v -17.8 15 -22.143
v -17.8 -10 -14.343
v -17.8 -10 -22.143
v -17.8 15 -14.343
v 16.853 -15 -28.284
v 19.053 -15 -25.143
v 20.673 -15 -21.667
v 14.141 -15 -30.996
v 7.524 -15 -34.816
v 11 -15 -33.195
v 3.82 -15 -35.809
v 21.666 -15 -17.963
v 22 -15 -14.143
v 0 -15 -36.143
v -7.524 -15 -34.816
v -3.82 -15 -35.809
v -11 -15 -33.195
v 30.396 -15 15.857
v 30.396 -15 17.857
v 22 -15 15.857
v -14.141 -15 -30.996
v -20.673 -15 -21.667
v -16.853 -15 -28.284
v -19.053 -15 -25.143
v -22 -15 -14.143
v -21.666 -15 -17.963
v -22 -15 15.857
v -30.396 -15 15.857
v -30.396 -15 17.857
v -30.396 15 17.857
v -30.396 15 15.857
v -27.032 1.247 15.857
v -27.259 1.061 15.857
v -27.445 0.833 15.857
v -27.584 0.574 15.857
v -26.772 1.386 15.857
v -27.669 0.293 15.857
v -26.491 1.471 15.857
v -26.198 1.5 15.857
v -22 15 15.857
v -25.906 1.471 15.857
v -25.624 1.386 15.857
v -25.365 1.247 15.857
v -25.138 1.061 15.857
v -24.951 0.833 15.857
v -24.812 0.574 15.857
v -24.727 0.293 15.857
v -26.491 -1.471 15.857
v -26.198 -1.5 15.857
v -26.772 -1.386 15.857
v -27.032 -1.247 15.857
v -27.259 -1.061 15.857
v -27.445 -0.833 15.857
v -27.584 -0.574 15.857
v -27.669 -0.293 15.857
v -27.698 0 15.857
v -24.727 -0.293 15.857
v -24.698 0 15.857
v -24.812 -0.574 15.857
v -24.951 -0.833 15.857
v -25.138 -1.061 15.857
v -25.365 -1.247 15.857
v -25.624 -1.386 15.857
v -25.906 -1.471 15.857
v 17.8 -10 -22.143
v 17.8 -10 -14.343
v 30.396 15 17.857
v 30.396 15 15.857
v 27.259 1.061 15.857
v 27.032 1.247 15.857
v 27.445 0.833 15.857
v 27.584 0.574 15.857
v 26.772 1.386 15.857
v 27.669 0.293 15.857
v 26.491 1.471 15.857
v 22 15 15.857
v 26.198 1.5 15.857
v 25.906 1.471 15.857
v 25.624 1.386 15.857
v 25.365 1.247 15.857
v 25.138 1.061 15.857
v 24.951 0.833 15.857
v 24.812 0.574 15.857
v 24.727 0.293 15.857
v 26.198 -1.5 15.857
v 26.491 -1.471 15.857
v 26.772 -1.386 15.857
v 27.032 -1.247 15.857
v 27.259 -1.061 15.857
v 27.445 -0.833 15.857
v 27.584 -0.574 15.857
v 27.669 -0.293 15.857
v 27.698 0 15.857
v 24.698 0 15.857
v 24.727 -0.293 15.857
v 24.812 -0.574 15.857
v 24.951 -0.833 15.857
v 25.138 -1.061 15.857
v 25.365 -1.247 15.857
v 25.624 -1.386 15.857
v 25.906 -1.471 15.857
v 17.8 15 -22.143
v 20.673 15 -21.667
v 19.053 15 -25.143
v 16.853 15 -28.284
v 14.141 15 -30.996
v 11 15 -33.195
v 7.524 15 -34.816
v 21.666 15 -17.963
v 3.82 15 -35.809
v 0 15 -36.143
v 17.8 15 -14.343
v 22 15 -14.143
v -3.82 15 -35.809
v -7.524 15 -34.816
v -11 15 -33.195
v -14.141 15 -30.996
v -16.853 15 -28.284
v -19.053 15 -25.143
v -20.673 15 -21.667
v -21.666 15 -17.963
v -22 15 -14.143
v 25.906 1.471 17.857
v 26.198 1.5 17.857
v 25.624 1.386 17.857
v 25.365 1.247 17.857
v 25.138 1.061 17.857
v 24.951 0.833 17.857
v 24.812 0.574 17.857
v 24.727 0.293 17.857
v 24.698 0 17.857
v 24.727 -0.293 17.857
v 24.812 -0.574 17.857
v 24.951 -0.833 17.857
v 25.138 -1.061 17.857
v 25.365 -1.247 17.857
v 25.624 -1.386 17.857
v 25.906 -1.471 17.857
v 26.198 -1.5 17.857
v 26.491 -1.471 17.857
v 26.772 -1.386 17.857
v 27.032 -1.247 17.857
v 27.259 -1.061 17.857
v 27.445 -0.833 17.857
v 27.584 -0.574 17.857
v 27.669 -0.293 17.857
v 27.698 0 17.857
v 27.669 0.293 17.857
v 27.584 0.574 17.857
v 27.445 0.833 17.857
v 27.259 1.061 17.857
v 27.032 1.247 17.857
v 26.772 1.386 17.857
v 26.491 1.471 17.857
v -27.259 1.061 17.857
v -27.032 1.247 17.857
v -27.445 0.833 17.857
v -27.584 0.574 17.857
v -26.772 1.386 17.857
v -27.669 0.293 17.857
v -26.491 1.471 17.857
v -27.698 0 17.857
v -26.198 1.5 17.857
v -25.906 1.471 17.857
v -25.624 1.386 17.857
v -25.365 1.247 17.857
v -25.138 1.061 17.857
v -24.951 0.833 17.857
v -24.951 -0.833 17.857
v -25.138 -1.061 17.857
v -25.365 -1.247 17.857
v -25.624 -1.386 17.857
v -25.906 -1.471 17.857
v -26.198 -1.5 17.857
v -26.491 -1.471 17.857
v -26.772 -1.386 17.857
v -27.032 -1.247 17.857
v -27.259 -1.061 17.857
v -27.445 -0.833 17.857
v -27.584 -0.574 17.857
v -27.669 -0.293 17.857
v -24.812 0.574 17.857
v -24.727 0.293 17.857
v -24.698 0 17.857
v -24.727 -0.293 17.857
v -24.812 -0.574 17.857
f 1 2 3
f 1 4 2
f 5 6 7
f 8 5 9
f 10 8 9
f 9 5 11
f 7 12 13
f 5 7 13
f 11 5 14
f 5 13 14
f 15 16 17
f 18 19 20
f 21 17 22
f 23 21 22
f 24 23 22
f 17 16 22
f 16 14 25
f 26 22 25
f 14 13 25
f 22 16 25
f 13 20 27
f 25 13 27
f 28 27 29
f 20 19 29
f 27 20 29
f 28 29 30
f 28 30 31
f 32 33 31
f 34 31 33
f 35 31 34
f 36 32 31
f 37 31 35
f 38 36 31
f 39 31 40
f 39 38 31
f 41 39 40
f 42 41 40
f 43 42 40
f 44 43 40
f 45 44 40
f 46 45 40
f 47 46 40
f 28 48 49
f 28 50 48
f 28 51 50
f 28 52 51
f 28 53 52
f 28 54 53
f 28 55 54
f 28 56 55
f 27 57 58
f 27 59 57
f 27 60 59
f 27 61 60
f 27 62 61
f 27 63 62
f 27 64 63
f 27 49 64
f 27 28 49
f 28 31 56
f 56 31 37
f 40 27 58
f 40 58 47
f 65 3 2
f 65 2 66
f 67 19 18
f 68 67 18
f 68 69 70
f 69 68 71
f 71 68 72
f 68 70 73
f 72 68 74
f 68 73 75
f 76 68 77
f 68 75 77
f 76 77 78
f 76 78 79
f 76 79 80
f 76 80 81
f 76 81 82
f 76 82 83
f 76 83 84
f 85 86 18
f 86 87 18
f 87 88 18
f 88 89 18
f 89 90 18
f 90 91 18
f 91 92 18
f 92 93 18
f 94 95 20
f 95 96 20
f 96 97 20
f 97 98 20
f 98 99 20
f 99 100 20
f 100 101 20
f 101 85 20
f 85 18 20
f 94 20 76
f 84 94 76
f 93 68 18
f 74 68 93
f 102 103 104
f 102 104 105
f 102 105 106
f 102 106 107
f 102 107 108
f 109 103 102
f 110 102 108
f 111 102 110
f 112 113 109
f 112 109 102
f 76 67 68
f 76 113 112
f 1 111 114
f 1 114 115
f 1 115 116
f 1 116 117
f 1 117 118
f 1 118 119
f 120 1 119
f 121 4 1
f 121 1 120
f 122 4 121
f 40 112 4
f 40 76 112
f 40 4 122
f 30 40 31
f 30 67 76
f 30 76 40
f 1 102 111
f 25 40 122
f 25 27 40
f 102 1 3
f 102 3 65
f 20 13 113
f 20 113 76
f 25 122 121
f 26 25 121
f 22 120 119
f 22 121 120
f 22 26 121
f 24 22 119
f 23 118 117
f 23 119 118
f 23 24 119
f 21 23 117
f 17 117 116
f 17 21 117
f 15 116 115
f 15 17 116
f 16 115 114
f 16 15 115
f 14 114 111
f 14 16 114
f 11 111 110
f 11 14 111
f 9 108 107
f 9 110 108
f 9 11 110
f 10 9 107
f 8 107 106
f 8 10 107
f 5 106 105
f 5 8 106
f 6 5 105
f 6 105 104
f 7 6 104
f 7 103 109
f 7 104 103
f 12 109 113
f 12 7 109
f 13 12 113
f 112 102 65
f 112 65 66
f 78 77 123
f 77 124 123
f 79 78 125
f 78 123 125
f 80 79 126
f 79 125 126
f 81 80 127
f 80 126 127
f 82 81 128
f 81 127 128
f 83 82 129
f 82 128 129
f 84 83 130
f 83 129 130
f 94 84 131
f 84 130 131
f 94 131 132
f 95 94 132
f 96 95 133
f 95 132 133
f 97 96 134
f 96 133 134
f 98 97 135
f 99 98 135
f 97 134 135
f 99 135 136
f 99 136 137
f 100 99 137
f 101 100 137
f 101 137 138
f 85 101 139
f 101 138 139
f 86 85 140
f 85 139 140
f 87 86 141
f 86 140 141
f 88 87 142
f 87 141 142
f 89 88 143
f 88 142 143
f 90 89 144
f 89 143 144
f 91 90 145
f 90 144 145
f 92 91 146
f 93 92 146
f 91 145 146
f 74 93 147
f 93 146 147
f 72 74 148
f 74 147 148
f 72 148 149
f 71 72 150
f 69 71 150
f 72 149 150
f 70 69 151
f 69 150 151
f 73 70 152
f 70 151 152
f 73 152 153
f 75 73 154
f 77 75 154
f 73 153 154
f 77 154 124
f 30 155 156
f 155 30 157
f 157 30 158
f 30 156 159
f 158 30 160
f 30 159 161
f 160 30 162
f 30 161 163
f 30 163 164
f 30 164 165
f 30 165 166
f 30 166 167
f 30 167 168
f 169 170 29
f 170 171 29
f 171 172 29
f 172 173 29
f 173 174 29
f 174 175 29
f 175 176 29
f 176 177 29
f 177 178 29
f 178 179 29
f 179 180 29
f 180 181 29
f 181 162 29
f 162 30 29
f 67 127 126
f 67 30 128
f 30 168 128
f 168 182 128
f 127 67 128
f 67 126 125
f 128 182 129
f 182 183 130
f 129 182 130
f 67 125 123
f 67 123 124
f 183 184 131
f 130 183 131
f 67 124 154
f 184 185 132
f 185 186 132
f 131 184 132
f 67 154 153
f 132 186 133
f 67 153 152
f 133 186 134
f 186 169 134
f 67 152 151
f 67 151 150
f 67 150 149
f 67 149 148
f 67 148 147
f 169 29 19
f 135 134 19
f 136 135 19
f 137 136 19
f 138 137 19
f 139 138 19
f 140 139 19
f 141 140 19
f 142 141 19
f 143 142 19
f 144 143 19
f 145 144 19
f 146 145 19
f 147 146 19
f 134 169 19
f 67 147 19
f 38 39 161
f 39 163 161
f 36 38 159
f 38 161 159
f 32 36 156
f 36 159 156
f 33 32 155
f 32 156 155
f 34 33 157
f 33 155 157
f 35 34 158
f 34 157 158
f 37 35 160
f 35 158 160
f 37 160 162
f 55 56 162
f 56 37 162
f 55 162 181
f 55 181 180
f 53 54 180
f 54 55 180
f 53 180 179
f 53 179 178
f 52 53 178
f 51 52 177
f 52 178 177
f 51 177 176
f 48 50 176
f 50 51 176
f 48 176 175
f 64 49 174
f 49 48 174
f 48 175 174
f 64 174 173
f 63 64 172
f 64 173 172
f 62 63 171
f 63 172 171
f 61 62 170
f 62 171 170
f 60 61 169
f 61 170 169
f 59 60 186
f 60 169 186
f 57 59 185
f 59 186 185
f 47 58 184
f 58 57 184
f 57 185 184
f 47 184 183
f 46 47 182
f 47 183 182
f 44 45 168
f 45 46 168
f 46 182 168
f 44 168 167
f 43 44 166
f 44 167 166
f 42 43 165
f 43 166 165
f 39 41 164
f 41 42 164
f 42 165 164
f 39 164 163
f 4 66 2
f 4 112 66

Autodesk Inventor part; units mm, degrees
ref_plane "YZ Plane" through (0, 0, 0) normal (1, 0, 0) x (0, 1, 0)
ref_plane "XZ Plane" through (0, 0, 0) normal (0, 1, 0) x (-1, 0, 0)
ref_plane "XY Plane" through (0, 0, 0) normal (0, 0, 1) x (1, 0, 0)
sketch "Sketch1" plane through (0, 0, 0) normal (0, 1, 0) x (-1, 0, 0)
  line L0 (-22, -14.1429) -> (-22, 15.8571)
  line L1 (-20.3963, 17.8571) -> (20.3963, 17.8571)
  line L2 (22, 15.8571) -> (22, -14.1429)
  arc A0 (-22, -14.1429) -> (22, -14.1429) centre (0, -14.1429) ccw
  line L3 (20.3963, 17.8571) -> (30.3963, 17.8571)
  line L4 (30.3963, 17.8571) -> (30.3963, 15.8571)
  line L5 (30.3963, 15.8571) -> (22, 15.8571)
  line L6 (-20.3963, 17.8571) -> (-30.3963, 17.8571)
  line L7 (-30.3963, 17.8571) -> (-30.3963, 15.8571)
  line L8 (-30.3963, 15.8571) -> (-22, 15.8571)
  point P0 (0, 0)
  point P1 (0, 17.8571)
  point P2 (22, 0)
  dimension "d1" = 2
  dimension "d2" = 2
  dimension "d3" = 10
  dimension "d4" = 10
  dimension "d5" = 30
  dimension "d6" = 22
extrude "Extrusion1" add sketch "Sketch1" along normal mid plane 30
sketch "Sketch2" plane through (0, 15, 0) normal (0, 1, 0) x (1, 0, 0)
  arc A0 (22, 14.1429) -> (-22, 14.1429) centre (0, 14.1429) ccw projected
  line L0 (-17.8, 22.1429) -> (17.8, 22.1429)
  line L1 (17.8, 22.1429) -> (17.8, 14.3429)
  line L2 (17.8, 14.3429) -> (-17.8, 14.3429)
  line L3 (-17.8, 14.3429) -> (-17.8, 22.1429)
  line L4 (-30.3963, -17.8571) -> (30.3963, -17.8571) projected
  point P0 (0, 0)
  point P1 (0, 36.1429)
  point P2 (0, 22.1429)
  dimension "d33" = 40
  dimension "d34" = 35.6
  dimension "d35" = 7.8
extrude "Extrusion2" cut sketch "Sketch2" against normal blind 25
sketch "Sketch3" plane through (30.3963, 15, 15.8571) normal (0, 0, -1) x (-1, 0, 0)
  line L0 (0, -30) -> (0, 0) projected
  line L1 (0, 0) -> (8.3963, 0) projected
  point P0 (30.3963, -15)
  point P1 (4.1982, -15)
  point P2 (0, -15)
  point P3 (4.1982, 0)
hole "Hole1" at (26.1982, 0, 15.8571) direction (0, 0, 1) diameter 3 depth 2
mirror "Mirror1" about plane through (0, 0, 0) normal (1, 0, 0) of "Hole1"
properties part number "Part_B7"
